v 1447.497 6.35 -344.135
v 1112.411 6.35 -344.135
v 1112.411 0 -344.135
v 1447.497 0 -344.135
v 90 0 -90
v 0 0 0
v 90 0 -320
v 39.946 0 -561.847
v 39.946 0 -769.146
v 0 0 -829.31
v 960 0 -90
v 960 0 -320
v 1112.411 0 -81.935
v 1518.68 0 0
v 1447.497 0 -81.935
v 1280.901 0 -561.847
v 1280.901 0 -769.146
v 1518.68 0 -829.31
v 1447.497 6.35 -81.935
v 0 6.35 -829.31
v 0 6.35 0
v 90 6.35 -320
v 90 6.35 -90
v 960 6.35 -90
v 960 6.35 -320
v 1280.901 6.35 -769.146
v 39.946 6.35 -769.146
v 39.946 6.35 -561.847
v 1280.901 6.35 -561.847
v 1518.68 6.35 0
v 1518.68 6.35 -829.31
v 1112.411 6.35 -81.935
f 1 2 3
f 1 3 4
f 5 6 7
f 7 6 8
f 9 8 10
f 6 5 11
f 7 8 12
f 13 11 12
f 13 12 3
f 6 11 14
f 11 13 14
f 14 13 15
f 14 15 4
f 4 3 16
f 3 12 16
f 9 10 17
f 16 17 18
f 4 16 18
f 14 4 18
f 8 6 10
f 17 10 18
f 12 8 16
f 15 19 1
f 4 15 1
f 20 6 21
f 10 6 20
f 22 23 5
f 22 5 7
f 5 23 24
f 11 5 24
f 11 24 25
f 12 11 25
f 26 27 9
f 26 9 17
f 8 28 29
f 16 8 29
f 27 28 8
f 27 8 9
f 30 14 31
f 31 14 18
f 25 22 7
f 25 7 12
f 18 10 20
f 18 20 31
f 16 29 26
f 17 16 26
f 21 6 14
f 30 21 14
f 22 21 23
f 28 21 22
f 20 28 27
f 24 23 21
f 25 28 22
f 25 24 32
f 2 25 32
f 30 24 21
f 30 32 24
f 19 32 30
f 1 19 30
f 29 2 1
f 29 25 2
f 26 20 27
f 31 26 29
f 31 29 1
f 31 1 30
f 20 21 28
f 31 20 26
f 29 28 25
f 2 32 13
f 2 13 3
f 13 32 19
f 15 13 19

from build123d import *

# Parameters (mm, degrees)
SKETCH1_W           = 1518.68
SKETCH1_H           = 829.31
BOSS_EXTRUDE1_DEPTH = 6.35
CUT_EXTRUDE1_REACH  = 1732.371
SKETCH2_W           = 870
SKETCH2_H           = 230
SKETCH2_W_2         = 1240.954831331
SKETCH2_H_2         = 207.299090818
SKETCH2_W_3         = 335.086201595
SKETCH2_H_3         = 262.200219892


with BuildPart() as part:
    # Sketch1 → Boss-Extrude1 (new body)
    with BuildSketch(Plane(origin=(0, 0, 0), x_dir=(1, 0, 0), z_dir=(0, 1, 0))):
        with Locations((759.34, 414.655)):
            Rectangle(SKETCH1_W, SKETCH1_H)
    extrude(amount=BOSS_EXTRUDE1_DEPTH)

    # Sketch2 → Cut-Extrude1 (cut, up to next)
    with BuildSketch(Plane(origin=(0, 6.35, 0), x_dir=(1, 0, 0), z_dir=(0, 1, 0)), mode=Mode.PRIVATE) as cut_extrude1_sk1:
        with Locations((525, 205)):
            Rectangle(SKETCH2_W, SKETCH2_H)
    cut_extrude1_tool1 = extrude(cut_extrude1_sk1.sketch, amount=-CUT_EXTRUDE1_REACH, mode=Mode.PRIVATE) & part.part
    # Sketch2 → Cut-Extrude1 (cut, up to next)
    with BuildSketch(Plane(origin=(0, 6.35, 0), x_dir=(1, 0, 0), z_dir=(0, 1, 0)), mode=Mode.PRIVATE) as cut_extrude1_sk2:
        with Locations((660.423310547, 665.496365601)):
            Rectangle(SKETCH2_W_2, SKETCH2_H_2)
    cut_extrude1_tool2 = extrude(cut_extrude1_sk2.sketch, amount=-CUT_EXTRUDE1_REACH, mode=Mode.PRIVATE) & part.part
    # Sketch2 → Cut-Extrude1 (cut, up to next)
    with BuildSketch(Plane(origin=(0, 6.35, 0), x_dir=(1, 0, 0), z_dir=(0, 1, 0)), mode=Mode.PRIVATE) as cut_extrude1_sk3:
        with Locations((1279.95415502, 213.035336328)):
            Rectangle(SKETCH2_W_3, SKETCH2_H_3)
    cut_extrude1_tool3 = extrude(cut_extrude1_sk3.sketch, amount=-CUT_EXTRUDE1_REACH, mode=Mode.PRIVATE) & part.part
    add(cut_extrude1_tool1.solids().sort_by_distance((525, 6.35, -205))[0], mode=Mode.SUBTRACT)
    add(cut_extrude1_tool2.solids().sort_by_distance((660.423311, 6.35, -665.496366))[0], mode=Mode.SUBTRACT)
    add(cut_extrude1_tool3.solids().sort_by_distance((1279.954155, 6.35, -213.035336))[0], mode=Mode.SUBTRACT)


solid = part.part
